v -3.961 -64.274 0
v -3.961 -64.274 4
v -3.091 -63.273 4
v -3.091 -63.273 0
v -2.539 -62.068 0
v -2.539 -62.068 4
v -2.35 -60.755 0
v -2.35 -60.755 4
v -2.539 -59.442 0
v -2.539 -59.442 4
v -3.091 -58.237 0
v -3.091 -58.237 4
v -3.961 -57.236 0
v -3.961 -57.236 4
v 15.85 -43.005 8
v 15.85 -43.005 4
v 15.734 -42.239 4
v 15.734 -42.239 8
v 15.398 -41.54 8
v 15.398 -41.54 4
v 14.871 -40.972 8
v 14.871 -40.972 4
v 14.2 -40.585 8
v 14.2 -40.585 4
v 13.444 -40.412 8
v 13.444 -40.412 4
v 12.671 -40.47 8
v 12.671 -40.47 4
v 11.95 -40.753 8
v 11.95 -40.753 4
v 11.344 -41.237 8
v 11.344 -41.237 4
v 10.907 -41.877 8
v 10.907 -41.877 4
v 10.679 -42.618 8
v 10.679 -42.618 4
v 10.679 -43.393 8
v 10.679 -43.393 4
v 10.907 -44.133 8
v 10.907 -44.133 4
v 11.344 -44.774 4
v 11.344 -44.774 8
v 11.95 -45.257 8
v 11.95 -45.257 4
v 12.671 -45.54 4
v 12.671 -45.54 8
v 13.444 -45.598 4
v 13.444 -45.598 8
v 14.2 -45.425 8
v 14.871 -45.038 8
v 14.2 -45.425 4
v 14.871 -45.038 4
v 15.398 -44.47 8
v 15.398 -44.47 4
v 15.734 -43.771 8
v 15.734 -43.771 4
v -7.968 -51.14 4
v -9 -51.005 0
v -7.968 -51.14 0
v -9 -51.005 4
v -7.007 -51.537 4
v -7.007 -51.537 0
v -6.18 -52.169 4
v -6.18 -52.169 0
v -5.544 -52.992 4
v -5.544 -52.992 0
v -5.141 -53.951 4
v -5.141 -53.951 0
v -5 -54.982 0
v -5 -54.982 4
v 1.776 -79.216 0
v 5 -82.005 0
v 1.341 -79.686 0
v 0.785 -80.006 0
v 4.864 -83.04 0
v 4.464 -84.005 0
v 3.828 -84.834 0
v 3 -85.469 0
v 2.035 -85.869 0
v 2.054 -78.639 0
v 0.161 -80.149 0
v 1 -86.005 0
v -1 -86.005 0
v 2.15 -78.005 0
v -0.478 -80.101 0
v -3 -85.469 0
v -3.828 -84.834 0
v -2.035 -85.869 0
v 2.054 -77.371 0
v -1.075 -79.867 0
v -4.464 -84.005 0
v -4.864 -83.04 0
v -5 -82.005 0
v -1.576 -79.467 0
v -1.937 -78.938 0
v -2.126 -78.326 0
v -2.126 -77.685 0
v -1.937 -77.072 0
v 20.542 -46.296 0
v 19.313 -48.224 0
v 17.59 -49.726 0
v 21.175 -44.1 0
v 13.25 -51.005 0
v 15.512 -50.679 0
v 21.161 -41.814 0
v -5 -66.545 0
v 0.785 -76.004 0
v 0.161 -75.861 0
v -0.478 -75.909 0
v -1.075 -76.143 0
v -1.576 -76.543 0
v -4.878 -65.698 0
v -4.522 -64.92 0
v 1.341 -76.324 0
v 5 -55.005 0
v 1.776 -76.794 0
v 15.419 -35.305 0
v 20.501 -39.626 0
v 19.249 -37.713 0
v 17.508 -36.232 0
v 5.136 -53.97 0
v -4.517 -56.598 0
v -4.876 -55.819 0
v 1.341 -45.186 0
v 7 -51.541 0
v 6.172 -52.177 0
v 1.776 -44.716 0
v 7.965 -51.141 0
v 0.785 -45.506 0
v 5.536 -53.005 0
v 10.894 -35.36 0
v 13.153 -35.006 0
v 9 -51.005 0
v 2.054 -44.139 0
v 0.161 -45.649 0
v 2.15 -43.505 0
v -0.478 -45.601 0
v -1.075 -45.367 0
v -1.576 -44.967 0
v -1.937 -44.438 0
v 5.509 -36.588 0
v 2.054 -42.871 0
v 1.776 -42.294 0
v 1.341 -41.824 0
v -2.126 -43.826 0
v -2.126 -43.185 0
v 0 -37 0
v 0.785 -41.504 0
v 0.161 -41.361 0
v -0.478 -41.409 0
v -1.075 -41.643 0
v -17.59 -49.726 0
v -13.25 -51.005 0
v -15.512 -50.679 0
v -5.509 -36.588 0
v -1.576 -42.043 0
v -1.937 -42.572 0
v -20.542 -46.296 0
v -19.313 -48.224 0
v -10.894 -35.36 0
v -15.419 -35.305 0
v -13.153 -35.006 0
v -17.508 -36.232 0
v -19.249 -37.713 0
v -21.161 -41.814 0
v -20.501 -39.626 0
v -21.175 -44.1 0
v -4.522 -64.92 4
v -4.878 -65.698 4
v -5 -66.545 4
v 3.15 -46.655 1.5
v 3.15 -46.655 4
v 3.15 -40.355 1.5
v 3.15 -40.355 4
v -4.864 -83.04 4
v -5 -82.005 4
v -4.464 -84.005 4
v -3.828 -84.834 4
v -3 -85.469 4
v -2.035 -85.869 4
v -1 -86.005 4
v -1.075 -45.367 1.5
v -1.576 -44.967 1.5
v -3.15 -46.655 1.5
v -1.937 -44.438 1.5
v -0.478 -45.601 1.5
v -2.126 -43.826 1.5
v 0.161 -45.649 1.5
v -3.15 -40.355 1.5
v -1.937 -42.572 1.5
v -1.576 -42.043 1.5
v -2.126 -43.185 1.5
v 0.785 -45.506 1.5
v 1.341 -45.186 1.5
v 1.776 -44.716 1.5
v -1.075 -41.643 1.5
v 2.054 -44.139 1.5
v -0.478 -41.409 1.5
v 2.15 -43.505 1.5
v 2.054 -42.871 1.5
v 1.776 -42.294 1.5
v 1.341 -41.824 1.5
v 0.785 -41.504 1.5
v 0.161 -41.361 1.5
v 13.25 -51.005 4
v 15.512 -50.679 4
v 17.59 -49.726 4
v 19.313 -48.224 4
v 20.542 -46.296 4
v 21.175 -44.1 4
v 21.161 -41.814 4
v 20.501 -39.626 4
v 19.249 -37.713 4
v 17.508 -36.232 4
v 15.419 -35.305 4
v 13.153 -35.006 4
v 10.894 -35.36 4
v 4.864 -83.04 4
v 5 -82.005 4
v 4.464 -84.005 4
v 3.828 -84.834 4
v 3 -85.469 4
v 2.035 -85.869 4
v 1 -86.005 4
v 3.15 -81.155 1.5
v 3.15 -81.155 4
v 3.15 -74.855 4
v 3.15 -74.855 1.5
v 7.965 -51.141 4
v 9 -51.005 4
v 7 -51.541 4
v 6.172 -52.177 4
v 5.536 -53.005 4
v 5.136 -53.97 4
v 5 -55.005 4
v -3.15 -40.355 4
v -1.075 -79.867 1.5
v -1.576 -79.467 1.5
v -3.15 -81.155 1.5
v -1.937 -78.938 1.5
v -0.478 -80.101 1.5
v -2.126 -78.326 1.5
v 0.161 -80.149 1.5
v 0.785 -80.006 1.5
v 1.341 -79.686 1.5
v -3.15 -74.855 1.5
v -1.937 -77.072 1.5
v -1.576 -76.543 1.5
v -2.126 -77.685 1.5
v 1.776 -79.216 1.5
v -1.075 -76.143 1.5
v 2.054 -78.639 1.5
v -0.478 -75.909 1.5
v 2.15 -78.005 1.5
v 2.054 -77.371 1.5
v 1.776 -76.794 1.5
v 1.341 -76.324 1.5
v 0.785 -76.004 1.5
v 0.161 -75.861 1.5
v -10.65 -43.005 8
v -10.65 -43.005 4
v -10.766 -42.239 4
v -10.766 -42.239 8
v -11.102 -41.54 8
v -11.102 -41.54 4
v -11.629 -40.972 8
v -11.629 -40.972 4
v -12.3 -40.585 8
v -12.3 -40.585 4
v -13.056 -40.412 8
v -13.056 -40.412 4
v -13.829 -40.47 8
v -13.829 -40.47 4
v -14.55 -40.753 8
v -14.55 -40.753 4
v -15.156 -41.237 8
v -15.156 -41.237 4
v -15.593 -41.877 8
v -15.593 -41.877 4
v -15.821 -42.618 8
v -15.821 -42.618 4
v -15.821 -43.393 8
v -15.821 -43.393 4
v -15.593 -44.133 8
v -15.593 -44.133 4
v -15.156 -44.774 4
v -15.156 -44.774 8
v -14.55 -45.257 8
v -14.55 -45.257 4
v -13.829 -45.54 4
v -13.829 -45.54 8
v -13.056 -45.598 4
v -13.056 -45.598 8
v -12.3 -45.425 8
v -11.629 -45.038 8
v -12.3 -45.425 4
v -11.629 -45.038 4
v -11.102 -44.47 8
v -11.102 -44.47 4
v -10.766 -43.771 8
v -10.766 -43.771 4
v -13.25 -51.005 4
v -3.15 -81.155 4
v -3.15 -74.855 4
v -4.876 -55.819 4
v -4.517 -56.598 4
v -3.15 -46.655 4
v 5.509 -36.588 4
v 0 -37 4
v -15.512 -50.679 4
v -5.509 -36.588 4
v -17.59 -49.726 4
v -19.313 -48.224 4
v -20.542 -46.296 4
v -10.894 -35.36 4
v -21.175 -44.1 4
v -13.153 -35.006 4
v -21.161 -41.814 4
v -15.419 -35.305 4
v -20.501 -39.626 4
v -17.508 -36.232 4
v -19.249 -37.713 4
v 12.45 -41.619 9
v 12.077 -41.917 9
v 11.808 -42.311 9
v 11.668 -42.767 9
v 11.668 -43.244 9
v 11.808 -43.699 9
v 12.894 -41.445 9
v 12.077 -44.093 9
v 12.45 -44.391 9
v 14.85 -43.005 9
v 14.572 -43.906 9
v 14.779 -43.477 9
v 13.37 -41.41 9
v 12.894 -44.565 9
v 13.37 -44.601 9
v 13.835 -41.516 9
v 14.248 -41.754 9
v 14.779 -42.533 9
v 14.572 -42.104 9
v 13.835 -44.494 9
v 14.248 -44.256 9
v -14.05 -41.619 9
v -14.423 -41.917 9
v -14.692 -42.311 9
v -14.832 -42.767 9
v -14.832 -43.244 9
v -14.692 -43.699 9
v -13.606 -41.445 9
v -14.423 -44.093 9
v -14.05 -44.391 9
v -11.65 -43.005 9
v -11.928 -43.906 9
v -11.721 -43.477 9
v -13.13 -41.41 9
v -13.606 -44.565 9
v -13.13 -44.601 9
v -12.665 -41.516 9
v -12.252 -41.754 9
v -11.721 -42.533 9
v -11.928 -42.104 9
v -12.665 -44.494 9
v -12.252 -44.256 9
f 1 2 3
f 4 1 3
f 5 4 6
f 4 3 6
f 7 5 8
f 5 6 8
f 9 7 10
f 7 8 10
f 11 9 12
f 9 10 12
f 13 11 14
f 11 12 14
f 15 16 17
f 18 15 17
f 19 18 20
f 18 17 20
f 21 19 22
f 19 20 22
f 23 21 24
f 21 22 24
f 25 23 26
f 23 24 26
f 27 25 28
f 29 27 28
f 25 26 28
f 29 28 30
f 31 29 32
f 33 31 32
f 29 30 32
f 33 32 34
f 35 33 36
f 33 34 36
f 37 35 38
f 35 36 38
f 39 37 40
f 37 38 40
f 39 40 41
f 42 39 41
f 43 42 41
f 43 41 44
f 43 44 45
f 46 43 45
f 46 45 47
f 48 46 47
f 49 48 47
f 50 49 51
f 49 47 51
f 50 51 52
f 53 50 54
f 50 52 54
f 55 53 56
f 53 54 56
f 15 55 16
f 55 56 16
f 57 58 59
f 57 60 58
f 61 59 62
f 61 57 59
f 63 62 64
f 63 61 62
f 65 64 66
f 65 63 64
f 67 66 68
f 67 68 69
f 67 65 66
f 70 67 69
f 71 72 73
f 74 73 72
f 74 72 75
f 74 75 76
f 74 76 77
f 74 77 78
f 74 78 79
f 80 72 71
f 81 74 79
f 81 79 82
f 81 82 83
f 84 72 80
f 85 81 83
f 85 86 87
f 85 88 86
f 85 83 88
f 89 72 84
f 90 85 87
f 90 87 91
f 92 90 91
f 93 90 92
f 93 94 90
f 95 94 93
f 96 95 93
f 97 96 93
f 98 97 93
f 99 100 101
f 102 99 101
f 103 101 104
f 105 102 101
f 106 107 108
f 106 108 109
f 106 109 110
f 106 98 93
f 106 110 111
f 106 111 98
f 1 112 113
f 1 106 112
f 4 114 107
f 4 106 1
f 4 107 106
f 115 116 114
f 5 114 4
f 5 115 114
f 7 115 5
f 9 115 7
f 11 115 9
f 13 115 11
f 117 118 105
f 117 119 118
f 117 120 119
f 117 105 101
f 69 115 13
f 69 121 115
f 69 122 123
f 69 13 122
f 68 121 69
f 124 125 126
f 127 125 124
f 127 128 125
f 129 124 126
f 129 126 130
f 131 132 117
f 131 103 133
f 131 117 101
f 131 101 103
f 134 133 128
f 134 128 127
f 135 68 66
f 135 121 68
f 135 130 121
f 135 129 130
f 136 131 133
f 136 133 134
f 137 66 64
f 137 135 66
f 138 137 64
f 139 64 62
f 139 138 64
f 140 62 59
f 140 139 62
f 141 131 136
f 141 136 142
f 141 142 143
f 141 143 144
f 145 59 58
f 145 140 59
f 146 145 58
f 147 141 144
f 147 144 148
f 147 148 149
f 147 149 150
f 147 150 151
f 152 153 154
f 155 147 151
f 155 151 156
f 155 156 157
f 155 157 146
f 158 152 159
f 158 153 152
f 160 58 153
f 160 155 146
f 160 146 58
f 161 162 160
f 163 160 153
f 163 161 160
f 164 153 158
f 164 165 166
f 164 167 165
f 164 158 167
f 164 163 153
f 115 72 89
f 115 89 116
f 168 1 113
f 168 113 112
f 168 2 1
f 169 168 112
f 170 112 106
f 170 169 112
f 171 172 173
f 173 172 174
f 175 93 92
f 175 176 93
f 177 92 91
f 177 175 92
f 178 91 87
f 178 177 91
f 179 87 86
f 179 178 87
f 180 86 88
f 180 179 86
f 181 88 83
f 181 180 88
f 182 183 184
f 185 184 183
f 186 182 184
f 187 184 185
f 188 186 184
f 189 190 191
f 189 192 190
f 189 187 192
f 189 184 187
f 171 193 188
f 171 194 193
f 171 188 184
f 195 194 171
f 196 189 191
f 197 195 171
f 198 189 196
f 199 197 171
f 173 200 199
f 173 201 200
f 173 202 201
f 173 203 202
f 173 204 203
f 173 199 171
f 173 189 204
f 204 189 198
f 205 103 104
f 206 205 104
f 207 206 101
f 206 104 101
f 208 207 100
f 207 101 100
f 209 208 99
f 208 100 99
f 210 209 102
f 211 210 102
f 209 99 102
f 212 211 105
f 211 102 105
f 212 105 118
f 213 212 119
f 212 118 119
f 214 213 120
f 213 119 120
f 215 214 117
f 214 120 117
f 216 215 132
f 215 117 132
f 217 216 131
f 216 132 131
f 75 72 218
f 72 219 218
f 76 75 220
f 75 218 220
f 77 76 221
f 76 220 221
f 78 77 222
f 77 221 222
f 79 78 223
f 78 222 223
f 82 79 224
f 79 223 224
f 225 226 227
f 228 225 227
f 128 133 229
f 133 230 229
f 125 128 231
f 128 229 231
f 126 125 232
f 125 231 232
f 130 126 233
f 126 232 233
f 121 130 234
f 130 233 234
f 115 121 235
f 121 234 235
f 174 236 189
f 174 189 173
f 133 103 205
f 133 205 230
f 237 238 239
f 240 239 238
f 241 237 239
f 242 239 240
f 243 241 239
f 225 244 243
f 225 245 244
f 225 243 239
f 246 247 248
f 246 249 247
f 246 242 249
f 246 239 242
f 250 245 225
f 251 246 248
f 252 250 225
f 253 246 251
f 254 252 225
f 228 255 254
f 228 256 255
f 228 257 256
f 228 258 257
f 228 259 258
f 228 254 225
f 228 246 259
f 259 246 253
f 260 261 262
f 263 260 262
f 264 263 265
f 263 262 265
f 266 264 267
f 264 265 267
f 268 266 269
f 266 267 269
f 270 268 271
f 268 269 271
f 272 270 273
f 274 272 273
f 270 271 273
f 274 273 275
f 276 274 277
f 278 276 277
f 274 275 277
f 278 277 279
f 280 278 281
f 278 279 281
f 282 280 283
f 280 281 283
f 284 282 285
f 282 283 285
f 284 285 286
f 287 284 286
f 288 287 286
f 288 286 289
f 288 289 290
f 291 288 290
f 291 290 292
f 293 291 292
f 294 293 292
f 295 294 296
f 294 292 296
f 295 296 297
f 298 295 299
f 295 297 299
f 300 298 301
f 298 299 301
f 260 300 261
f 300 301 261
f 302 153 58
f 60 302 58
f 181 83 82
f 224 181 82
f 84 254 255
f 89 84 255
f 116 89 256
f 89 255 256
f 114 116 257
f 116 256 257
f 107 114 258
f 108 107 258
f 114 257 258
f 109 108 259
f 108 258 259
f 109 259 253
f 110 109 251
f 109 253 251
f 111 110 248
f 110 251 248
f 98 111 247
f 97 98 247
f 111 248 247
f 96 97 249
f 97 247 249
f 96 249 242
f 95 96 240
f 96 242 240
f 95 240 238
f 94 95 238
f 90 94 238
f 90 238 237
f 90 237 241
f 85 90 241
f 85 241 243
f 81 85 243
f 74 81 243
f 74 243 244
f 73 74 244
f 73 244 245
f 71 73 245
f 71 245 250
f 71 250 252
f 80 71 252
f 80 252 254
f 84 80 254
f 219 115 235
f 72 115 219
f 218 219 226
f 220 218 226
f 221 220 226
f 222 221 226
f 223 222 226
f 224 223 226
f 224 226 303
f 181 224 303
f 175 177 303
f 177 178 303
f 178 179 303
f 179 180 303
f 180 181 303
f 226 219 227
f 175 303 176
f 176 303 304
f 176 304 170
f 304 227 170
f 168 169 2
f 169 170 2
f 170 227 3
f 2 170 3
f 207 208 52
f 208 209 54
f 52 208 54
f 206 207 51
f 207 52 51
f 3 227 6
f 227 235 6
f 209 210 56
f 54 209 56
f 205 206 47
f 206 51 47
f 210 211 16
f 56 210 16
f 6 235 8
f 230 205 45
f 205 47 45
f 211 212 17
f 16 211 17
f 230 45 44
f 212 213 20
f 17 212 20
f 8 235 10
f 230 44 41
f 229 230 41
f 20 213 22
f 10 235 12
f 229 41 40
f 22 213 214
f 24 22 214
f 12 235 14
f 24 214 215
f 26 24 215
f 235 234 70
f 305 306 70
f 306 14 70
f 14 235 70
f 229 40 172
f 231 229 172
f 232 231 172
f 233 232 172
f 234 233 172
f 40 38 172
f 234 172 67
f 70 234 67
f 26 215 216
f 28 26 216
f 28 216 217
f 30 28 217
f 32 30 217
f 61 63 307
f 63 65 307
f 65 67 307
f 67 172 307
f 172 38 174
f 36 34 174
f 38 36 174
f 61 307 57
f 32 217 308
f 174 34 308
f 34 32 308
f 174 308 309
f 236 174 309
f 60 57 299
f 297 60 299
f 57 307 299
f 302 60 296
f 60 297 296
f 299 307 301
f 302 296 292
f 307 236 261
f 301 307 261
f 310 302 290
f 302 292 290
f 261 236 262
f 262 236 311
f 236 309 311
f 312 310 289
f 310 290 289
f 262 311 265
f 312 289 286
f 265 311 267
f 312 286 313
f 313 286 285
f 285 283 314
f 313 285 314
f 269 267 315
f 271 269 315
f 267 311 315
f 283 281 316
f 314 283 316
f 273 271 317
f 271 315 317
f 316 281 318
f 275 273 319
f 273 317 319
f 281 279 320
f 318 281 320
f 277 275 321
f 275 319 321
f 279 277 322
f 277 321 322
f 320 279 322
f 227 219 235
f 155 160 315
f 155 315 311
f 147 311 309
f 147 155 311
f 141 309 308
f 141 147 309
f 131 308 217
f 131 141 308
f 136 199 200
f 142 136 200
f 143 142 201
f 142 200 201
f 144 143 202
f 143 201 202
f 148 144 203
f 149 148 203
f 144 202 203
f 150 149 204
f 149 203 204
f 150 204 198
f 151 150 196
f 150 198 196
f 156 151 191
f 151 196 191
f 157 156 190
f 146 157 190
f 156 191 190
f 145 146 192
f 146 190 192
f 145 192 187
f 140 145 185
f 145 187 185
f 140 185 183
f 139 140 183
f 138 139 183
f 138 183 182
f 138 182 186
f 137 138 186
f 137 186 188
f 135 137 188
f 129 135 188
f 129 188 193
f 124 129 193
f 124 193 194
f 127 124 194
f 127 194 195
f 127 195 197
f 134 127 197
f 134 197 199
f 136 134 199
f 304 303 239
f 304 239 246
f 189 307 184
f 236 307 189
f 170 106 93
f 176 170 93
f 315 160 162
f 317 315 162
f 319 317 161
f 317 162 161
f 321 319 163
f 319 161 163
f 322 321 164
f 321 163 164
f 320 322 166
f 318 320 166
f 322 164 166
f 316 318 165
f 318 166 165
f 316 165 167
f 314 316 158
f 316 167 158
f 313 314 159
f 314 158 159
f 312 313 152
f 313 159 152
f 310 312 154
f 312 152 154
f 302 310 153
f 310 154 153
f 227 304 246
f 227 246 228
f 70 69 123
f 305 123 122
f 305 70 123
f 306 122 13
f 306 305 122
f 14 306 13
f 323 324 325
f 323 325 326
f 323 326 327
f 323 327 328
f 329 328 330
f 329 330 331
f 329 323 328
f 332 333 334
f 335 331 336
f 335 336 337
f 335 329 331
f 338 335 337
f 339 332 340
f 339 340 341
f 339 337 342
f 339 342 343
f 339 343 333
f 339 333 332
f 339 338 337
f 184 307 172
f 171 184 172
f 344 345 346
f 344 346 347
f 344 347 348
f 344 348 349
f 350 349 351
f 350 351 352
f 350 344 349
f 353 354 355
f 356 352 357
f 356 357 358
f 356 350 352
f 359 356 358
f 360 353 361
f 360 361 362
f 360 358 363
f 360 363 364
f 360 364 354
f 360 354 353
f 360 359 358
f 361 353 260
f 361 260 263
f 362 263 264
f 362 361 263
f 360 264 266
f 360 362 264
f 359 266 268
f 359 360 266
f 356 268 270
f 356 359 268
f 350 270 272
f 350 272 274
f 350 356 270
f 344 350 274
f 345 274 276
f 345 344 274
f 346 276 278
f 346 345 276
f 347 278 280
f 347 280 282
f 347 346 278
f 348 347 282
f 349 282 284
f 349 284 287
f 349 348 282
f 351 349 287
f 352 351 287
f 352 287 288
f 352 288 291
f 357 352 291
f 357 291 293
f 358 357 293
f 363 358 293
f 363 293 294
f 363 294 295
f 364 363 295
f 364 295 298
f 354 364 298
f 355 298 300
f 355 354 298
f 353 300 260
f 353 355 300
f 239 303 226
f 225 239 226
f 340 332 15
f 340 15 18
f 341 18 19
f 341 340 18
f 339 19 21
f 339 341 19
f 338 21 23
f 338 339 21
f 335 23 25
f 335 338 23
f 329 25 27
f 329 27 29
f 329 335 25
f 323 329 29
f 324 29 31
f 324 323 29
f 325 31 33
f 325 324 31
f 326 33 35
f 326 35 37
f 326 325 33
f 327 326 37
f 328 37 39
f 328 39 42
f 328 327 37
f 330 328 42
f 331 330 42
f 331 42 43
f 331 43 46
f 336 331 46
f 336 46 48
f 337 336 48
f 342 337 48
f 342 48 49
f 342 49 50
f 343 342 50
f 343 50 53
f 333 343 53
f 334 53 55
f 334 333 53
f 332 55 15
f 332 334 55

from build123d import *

# Parameters (mm, degrees)
PAD_DEPTH       = 4
SKETCH001_R     = 2.6
PAD001_DEPTH    = 5
SKETCH002_R     = 2.15
POCKET_DEPTH    = 4.001
SKETCH003_W     = 6.3
SKETCH003_H     = 6.3
POCKET001_DEPTH = 2.5
FILLET_R        = 4
CHAMFER_SIZE    = 1
SKETCH004_R     = 4.65
POCKET002_DEPTH = 4.001
FILLET001_R     = 3


with BuildPart() as part:
    # Sketch → Pad (new body)
    with BuildSketch(Plane.XY):
        with BuildLine():
            ThreePointArc((-10.894444, -35.359738), (0, -37), (10.894444, -35.359738))
            ThreePointArc((13.25, -51.005087), (21.16084, -41.814035), (10.894444, -35.359738))
            Line((13.25, -51.005087), (5, -51.005087))
            Line((5, -51.005087), (5, -86.005087))
            Line((-5, -86.005087), (5, -86.005087))
            Line((-5, -51.005087), (-5, -86.005087))
            Line((-13.25, -51.005087), (-5, -51.005087))
            ThreePointArc((-10.894444, -35.359738), (-21.16084, -41.814035), (-13.25, -51.005087))
        make_face()
    extrude(amount=PAD_DEPTH)

    # Sketch001 (on Face10 of Pad) → Pad001 (join)
    with BuildSketch(Plane.XY.offset(4)):
        with Locations((-13.25, -43.005087)):
            Circle(SKETCH001_R)
        with Locations((13.25, -43.005087)):
            Circle(SKETCH001_R)
    extrude(amount=PAD001_DEPTH)

    # Sketch002 (on Face5 of Pad001) → Pocket (cut, through all)
    with BuildSketch(Plane.XY.offset(4)):
        with Locations((0, -43.505087)):
            Circle(SKETCH002_R)
        with Locations((0, -78.005087)):
            Circle(SKETCH002_R)
    extrude(amount=-POCKET_DEPTH, mode=Mode.SUBTRACT)

    # Sketch003 (on Face5 of Pocket) → Pocket001 (cut)
    with BuildSketch(Plane.XY.offset(4)):
        with Locations((0, -43.505087)):
            Rectangle(SKETCH003_W, SKETCH003_H)
        with Locations((0, -78.005087)):
            Rectangle(SKETCH003_W, SKETCH003_H)
    extrude(amount=-POCKET001_DEPTH, mode=Mode.SUBTRACT)

    # Fillet
    fillet_edges = [part.edges().sort_by_distance(p)[0] for p in [
        (5, -51.005087, 2),
        (-5, -51.005087, 2),
        (-5, -86.005087, 2),
        (5, -86.005087, 2),
    ]]
    fillet(fillet_edges, radius=FILLET_R)

    # Chamfer
    chamfer_edges = [part.edges().sort_by_distance(p)[0] for p in [
        (-15.85, -43.005087, 9),
        (10.65, -43.005087, 9),
    ]]
    chamfer(chamfer_edges, length=CHAMFER_SIZE)

    # Sketch004 (on Face3 of Chamfer) → Pocket002 (cut, through all)
    with BuildSketch(Plane.XY.offset(4)):
        with Locations((-7, -60.755087)):
            Circle(SKETCH004_R)
    extrude(amount=-POCKET002_DEPTH, mode=Mode.SUBTRACT)

    # Fillet001
    fillet001_edges = [part.edges().sort_by_distance(p)[0] for p in [
        (-5, -56.557171, 2),
        (-5, -64.953003, 2),
    ]]
    fillet(fillet001_edges, radius=FILLET001_R)


solid = part.part
